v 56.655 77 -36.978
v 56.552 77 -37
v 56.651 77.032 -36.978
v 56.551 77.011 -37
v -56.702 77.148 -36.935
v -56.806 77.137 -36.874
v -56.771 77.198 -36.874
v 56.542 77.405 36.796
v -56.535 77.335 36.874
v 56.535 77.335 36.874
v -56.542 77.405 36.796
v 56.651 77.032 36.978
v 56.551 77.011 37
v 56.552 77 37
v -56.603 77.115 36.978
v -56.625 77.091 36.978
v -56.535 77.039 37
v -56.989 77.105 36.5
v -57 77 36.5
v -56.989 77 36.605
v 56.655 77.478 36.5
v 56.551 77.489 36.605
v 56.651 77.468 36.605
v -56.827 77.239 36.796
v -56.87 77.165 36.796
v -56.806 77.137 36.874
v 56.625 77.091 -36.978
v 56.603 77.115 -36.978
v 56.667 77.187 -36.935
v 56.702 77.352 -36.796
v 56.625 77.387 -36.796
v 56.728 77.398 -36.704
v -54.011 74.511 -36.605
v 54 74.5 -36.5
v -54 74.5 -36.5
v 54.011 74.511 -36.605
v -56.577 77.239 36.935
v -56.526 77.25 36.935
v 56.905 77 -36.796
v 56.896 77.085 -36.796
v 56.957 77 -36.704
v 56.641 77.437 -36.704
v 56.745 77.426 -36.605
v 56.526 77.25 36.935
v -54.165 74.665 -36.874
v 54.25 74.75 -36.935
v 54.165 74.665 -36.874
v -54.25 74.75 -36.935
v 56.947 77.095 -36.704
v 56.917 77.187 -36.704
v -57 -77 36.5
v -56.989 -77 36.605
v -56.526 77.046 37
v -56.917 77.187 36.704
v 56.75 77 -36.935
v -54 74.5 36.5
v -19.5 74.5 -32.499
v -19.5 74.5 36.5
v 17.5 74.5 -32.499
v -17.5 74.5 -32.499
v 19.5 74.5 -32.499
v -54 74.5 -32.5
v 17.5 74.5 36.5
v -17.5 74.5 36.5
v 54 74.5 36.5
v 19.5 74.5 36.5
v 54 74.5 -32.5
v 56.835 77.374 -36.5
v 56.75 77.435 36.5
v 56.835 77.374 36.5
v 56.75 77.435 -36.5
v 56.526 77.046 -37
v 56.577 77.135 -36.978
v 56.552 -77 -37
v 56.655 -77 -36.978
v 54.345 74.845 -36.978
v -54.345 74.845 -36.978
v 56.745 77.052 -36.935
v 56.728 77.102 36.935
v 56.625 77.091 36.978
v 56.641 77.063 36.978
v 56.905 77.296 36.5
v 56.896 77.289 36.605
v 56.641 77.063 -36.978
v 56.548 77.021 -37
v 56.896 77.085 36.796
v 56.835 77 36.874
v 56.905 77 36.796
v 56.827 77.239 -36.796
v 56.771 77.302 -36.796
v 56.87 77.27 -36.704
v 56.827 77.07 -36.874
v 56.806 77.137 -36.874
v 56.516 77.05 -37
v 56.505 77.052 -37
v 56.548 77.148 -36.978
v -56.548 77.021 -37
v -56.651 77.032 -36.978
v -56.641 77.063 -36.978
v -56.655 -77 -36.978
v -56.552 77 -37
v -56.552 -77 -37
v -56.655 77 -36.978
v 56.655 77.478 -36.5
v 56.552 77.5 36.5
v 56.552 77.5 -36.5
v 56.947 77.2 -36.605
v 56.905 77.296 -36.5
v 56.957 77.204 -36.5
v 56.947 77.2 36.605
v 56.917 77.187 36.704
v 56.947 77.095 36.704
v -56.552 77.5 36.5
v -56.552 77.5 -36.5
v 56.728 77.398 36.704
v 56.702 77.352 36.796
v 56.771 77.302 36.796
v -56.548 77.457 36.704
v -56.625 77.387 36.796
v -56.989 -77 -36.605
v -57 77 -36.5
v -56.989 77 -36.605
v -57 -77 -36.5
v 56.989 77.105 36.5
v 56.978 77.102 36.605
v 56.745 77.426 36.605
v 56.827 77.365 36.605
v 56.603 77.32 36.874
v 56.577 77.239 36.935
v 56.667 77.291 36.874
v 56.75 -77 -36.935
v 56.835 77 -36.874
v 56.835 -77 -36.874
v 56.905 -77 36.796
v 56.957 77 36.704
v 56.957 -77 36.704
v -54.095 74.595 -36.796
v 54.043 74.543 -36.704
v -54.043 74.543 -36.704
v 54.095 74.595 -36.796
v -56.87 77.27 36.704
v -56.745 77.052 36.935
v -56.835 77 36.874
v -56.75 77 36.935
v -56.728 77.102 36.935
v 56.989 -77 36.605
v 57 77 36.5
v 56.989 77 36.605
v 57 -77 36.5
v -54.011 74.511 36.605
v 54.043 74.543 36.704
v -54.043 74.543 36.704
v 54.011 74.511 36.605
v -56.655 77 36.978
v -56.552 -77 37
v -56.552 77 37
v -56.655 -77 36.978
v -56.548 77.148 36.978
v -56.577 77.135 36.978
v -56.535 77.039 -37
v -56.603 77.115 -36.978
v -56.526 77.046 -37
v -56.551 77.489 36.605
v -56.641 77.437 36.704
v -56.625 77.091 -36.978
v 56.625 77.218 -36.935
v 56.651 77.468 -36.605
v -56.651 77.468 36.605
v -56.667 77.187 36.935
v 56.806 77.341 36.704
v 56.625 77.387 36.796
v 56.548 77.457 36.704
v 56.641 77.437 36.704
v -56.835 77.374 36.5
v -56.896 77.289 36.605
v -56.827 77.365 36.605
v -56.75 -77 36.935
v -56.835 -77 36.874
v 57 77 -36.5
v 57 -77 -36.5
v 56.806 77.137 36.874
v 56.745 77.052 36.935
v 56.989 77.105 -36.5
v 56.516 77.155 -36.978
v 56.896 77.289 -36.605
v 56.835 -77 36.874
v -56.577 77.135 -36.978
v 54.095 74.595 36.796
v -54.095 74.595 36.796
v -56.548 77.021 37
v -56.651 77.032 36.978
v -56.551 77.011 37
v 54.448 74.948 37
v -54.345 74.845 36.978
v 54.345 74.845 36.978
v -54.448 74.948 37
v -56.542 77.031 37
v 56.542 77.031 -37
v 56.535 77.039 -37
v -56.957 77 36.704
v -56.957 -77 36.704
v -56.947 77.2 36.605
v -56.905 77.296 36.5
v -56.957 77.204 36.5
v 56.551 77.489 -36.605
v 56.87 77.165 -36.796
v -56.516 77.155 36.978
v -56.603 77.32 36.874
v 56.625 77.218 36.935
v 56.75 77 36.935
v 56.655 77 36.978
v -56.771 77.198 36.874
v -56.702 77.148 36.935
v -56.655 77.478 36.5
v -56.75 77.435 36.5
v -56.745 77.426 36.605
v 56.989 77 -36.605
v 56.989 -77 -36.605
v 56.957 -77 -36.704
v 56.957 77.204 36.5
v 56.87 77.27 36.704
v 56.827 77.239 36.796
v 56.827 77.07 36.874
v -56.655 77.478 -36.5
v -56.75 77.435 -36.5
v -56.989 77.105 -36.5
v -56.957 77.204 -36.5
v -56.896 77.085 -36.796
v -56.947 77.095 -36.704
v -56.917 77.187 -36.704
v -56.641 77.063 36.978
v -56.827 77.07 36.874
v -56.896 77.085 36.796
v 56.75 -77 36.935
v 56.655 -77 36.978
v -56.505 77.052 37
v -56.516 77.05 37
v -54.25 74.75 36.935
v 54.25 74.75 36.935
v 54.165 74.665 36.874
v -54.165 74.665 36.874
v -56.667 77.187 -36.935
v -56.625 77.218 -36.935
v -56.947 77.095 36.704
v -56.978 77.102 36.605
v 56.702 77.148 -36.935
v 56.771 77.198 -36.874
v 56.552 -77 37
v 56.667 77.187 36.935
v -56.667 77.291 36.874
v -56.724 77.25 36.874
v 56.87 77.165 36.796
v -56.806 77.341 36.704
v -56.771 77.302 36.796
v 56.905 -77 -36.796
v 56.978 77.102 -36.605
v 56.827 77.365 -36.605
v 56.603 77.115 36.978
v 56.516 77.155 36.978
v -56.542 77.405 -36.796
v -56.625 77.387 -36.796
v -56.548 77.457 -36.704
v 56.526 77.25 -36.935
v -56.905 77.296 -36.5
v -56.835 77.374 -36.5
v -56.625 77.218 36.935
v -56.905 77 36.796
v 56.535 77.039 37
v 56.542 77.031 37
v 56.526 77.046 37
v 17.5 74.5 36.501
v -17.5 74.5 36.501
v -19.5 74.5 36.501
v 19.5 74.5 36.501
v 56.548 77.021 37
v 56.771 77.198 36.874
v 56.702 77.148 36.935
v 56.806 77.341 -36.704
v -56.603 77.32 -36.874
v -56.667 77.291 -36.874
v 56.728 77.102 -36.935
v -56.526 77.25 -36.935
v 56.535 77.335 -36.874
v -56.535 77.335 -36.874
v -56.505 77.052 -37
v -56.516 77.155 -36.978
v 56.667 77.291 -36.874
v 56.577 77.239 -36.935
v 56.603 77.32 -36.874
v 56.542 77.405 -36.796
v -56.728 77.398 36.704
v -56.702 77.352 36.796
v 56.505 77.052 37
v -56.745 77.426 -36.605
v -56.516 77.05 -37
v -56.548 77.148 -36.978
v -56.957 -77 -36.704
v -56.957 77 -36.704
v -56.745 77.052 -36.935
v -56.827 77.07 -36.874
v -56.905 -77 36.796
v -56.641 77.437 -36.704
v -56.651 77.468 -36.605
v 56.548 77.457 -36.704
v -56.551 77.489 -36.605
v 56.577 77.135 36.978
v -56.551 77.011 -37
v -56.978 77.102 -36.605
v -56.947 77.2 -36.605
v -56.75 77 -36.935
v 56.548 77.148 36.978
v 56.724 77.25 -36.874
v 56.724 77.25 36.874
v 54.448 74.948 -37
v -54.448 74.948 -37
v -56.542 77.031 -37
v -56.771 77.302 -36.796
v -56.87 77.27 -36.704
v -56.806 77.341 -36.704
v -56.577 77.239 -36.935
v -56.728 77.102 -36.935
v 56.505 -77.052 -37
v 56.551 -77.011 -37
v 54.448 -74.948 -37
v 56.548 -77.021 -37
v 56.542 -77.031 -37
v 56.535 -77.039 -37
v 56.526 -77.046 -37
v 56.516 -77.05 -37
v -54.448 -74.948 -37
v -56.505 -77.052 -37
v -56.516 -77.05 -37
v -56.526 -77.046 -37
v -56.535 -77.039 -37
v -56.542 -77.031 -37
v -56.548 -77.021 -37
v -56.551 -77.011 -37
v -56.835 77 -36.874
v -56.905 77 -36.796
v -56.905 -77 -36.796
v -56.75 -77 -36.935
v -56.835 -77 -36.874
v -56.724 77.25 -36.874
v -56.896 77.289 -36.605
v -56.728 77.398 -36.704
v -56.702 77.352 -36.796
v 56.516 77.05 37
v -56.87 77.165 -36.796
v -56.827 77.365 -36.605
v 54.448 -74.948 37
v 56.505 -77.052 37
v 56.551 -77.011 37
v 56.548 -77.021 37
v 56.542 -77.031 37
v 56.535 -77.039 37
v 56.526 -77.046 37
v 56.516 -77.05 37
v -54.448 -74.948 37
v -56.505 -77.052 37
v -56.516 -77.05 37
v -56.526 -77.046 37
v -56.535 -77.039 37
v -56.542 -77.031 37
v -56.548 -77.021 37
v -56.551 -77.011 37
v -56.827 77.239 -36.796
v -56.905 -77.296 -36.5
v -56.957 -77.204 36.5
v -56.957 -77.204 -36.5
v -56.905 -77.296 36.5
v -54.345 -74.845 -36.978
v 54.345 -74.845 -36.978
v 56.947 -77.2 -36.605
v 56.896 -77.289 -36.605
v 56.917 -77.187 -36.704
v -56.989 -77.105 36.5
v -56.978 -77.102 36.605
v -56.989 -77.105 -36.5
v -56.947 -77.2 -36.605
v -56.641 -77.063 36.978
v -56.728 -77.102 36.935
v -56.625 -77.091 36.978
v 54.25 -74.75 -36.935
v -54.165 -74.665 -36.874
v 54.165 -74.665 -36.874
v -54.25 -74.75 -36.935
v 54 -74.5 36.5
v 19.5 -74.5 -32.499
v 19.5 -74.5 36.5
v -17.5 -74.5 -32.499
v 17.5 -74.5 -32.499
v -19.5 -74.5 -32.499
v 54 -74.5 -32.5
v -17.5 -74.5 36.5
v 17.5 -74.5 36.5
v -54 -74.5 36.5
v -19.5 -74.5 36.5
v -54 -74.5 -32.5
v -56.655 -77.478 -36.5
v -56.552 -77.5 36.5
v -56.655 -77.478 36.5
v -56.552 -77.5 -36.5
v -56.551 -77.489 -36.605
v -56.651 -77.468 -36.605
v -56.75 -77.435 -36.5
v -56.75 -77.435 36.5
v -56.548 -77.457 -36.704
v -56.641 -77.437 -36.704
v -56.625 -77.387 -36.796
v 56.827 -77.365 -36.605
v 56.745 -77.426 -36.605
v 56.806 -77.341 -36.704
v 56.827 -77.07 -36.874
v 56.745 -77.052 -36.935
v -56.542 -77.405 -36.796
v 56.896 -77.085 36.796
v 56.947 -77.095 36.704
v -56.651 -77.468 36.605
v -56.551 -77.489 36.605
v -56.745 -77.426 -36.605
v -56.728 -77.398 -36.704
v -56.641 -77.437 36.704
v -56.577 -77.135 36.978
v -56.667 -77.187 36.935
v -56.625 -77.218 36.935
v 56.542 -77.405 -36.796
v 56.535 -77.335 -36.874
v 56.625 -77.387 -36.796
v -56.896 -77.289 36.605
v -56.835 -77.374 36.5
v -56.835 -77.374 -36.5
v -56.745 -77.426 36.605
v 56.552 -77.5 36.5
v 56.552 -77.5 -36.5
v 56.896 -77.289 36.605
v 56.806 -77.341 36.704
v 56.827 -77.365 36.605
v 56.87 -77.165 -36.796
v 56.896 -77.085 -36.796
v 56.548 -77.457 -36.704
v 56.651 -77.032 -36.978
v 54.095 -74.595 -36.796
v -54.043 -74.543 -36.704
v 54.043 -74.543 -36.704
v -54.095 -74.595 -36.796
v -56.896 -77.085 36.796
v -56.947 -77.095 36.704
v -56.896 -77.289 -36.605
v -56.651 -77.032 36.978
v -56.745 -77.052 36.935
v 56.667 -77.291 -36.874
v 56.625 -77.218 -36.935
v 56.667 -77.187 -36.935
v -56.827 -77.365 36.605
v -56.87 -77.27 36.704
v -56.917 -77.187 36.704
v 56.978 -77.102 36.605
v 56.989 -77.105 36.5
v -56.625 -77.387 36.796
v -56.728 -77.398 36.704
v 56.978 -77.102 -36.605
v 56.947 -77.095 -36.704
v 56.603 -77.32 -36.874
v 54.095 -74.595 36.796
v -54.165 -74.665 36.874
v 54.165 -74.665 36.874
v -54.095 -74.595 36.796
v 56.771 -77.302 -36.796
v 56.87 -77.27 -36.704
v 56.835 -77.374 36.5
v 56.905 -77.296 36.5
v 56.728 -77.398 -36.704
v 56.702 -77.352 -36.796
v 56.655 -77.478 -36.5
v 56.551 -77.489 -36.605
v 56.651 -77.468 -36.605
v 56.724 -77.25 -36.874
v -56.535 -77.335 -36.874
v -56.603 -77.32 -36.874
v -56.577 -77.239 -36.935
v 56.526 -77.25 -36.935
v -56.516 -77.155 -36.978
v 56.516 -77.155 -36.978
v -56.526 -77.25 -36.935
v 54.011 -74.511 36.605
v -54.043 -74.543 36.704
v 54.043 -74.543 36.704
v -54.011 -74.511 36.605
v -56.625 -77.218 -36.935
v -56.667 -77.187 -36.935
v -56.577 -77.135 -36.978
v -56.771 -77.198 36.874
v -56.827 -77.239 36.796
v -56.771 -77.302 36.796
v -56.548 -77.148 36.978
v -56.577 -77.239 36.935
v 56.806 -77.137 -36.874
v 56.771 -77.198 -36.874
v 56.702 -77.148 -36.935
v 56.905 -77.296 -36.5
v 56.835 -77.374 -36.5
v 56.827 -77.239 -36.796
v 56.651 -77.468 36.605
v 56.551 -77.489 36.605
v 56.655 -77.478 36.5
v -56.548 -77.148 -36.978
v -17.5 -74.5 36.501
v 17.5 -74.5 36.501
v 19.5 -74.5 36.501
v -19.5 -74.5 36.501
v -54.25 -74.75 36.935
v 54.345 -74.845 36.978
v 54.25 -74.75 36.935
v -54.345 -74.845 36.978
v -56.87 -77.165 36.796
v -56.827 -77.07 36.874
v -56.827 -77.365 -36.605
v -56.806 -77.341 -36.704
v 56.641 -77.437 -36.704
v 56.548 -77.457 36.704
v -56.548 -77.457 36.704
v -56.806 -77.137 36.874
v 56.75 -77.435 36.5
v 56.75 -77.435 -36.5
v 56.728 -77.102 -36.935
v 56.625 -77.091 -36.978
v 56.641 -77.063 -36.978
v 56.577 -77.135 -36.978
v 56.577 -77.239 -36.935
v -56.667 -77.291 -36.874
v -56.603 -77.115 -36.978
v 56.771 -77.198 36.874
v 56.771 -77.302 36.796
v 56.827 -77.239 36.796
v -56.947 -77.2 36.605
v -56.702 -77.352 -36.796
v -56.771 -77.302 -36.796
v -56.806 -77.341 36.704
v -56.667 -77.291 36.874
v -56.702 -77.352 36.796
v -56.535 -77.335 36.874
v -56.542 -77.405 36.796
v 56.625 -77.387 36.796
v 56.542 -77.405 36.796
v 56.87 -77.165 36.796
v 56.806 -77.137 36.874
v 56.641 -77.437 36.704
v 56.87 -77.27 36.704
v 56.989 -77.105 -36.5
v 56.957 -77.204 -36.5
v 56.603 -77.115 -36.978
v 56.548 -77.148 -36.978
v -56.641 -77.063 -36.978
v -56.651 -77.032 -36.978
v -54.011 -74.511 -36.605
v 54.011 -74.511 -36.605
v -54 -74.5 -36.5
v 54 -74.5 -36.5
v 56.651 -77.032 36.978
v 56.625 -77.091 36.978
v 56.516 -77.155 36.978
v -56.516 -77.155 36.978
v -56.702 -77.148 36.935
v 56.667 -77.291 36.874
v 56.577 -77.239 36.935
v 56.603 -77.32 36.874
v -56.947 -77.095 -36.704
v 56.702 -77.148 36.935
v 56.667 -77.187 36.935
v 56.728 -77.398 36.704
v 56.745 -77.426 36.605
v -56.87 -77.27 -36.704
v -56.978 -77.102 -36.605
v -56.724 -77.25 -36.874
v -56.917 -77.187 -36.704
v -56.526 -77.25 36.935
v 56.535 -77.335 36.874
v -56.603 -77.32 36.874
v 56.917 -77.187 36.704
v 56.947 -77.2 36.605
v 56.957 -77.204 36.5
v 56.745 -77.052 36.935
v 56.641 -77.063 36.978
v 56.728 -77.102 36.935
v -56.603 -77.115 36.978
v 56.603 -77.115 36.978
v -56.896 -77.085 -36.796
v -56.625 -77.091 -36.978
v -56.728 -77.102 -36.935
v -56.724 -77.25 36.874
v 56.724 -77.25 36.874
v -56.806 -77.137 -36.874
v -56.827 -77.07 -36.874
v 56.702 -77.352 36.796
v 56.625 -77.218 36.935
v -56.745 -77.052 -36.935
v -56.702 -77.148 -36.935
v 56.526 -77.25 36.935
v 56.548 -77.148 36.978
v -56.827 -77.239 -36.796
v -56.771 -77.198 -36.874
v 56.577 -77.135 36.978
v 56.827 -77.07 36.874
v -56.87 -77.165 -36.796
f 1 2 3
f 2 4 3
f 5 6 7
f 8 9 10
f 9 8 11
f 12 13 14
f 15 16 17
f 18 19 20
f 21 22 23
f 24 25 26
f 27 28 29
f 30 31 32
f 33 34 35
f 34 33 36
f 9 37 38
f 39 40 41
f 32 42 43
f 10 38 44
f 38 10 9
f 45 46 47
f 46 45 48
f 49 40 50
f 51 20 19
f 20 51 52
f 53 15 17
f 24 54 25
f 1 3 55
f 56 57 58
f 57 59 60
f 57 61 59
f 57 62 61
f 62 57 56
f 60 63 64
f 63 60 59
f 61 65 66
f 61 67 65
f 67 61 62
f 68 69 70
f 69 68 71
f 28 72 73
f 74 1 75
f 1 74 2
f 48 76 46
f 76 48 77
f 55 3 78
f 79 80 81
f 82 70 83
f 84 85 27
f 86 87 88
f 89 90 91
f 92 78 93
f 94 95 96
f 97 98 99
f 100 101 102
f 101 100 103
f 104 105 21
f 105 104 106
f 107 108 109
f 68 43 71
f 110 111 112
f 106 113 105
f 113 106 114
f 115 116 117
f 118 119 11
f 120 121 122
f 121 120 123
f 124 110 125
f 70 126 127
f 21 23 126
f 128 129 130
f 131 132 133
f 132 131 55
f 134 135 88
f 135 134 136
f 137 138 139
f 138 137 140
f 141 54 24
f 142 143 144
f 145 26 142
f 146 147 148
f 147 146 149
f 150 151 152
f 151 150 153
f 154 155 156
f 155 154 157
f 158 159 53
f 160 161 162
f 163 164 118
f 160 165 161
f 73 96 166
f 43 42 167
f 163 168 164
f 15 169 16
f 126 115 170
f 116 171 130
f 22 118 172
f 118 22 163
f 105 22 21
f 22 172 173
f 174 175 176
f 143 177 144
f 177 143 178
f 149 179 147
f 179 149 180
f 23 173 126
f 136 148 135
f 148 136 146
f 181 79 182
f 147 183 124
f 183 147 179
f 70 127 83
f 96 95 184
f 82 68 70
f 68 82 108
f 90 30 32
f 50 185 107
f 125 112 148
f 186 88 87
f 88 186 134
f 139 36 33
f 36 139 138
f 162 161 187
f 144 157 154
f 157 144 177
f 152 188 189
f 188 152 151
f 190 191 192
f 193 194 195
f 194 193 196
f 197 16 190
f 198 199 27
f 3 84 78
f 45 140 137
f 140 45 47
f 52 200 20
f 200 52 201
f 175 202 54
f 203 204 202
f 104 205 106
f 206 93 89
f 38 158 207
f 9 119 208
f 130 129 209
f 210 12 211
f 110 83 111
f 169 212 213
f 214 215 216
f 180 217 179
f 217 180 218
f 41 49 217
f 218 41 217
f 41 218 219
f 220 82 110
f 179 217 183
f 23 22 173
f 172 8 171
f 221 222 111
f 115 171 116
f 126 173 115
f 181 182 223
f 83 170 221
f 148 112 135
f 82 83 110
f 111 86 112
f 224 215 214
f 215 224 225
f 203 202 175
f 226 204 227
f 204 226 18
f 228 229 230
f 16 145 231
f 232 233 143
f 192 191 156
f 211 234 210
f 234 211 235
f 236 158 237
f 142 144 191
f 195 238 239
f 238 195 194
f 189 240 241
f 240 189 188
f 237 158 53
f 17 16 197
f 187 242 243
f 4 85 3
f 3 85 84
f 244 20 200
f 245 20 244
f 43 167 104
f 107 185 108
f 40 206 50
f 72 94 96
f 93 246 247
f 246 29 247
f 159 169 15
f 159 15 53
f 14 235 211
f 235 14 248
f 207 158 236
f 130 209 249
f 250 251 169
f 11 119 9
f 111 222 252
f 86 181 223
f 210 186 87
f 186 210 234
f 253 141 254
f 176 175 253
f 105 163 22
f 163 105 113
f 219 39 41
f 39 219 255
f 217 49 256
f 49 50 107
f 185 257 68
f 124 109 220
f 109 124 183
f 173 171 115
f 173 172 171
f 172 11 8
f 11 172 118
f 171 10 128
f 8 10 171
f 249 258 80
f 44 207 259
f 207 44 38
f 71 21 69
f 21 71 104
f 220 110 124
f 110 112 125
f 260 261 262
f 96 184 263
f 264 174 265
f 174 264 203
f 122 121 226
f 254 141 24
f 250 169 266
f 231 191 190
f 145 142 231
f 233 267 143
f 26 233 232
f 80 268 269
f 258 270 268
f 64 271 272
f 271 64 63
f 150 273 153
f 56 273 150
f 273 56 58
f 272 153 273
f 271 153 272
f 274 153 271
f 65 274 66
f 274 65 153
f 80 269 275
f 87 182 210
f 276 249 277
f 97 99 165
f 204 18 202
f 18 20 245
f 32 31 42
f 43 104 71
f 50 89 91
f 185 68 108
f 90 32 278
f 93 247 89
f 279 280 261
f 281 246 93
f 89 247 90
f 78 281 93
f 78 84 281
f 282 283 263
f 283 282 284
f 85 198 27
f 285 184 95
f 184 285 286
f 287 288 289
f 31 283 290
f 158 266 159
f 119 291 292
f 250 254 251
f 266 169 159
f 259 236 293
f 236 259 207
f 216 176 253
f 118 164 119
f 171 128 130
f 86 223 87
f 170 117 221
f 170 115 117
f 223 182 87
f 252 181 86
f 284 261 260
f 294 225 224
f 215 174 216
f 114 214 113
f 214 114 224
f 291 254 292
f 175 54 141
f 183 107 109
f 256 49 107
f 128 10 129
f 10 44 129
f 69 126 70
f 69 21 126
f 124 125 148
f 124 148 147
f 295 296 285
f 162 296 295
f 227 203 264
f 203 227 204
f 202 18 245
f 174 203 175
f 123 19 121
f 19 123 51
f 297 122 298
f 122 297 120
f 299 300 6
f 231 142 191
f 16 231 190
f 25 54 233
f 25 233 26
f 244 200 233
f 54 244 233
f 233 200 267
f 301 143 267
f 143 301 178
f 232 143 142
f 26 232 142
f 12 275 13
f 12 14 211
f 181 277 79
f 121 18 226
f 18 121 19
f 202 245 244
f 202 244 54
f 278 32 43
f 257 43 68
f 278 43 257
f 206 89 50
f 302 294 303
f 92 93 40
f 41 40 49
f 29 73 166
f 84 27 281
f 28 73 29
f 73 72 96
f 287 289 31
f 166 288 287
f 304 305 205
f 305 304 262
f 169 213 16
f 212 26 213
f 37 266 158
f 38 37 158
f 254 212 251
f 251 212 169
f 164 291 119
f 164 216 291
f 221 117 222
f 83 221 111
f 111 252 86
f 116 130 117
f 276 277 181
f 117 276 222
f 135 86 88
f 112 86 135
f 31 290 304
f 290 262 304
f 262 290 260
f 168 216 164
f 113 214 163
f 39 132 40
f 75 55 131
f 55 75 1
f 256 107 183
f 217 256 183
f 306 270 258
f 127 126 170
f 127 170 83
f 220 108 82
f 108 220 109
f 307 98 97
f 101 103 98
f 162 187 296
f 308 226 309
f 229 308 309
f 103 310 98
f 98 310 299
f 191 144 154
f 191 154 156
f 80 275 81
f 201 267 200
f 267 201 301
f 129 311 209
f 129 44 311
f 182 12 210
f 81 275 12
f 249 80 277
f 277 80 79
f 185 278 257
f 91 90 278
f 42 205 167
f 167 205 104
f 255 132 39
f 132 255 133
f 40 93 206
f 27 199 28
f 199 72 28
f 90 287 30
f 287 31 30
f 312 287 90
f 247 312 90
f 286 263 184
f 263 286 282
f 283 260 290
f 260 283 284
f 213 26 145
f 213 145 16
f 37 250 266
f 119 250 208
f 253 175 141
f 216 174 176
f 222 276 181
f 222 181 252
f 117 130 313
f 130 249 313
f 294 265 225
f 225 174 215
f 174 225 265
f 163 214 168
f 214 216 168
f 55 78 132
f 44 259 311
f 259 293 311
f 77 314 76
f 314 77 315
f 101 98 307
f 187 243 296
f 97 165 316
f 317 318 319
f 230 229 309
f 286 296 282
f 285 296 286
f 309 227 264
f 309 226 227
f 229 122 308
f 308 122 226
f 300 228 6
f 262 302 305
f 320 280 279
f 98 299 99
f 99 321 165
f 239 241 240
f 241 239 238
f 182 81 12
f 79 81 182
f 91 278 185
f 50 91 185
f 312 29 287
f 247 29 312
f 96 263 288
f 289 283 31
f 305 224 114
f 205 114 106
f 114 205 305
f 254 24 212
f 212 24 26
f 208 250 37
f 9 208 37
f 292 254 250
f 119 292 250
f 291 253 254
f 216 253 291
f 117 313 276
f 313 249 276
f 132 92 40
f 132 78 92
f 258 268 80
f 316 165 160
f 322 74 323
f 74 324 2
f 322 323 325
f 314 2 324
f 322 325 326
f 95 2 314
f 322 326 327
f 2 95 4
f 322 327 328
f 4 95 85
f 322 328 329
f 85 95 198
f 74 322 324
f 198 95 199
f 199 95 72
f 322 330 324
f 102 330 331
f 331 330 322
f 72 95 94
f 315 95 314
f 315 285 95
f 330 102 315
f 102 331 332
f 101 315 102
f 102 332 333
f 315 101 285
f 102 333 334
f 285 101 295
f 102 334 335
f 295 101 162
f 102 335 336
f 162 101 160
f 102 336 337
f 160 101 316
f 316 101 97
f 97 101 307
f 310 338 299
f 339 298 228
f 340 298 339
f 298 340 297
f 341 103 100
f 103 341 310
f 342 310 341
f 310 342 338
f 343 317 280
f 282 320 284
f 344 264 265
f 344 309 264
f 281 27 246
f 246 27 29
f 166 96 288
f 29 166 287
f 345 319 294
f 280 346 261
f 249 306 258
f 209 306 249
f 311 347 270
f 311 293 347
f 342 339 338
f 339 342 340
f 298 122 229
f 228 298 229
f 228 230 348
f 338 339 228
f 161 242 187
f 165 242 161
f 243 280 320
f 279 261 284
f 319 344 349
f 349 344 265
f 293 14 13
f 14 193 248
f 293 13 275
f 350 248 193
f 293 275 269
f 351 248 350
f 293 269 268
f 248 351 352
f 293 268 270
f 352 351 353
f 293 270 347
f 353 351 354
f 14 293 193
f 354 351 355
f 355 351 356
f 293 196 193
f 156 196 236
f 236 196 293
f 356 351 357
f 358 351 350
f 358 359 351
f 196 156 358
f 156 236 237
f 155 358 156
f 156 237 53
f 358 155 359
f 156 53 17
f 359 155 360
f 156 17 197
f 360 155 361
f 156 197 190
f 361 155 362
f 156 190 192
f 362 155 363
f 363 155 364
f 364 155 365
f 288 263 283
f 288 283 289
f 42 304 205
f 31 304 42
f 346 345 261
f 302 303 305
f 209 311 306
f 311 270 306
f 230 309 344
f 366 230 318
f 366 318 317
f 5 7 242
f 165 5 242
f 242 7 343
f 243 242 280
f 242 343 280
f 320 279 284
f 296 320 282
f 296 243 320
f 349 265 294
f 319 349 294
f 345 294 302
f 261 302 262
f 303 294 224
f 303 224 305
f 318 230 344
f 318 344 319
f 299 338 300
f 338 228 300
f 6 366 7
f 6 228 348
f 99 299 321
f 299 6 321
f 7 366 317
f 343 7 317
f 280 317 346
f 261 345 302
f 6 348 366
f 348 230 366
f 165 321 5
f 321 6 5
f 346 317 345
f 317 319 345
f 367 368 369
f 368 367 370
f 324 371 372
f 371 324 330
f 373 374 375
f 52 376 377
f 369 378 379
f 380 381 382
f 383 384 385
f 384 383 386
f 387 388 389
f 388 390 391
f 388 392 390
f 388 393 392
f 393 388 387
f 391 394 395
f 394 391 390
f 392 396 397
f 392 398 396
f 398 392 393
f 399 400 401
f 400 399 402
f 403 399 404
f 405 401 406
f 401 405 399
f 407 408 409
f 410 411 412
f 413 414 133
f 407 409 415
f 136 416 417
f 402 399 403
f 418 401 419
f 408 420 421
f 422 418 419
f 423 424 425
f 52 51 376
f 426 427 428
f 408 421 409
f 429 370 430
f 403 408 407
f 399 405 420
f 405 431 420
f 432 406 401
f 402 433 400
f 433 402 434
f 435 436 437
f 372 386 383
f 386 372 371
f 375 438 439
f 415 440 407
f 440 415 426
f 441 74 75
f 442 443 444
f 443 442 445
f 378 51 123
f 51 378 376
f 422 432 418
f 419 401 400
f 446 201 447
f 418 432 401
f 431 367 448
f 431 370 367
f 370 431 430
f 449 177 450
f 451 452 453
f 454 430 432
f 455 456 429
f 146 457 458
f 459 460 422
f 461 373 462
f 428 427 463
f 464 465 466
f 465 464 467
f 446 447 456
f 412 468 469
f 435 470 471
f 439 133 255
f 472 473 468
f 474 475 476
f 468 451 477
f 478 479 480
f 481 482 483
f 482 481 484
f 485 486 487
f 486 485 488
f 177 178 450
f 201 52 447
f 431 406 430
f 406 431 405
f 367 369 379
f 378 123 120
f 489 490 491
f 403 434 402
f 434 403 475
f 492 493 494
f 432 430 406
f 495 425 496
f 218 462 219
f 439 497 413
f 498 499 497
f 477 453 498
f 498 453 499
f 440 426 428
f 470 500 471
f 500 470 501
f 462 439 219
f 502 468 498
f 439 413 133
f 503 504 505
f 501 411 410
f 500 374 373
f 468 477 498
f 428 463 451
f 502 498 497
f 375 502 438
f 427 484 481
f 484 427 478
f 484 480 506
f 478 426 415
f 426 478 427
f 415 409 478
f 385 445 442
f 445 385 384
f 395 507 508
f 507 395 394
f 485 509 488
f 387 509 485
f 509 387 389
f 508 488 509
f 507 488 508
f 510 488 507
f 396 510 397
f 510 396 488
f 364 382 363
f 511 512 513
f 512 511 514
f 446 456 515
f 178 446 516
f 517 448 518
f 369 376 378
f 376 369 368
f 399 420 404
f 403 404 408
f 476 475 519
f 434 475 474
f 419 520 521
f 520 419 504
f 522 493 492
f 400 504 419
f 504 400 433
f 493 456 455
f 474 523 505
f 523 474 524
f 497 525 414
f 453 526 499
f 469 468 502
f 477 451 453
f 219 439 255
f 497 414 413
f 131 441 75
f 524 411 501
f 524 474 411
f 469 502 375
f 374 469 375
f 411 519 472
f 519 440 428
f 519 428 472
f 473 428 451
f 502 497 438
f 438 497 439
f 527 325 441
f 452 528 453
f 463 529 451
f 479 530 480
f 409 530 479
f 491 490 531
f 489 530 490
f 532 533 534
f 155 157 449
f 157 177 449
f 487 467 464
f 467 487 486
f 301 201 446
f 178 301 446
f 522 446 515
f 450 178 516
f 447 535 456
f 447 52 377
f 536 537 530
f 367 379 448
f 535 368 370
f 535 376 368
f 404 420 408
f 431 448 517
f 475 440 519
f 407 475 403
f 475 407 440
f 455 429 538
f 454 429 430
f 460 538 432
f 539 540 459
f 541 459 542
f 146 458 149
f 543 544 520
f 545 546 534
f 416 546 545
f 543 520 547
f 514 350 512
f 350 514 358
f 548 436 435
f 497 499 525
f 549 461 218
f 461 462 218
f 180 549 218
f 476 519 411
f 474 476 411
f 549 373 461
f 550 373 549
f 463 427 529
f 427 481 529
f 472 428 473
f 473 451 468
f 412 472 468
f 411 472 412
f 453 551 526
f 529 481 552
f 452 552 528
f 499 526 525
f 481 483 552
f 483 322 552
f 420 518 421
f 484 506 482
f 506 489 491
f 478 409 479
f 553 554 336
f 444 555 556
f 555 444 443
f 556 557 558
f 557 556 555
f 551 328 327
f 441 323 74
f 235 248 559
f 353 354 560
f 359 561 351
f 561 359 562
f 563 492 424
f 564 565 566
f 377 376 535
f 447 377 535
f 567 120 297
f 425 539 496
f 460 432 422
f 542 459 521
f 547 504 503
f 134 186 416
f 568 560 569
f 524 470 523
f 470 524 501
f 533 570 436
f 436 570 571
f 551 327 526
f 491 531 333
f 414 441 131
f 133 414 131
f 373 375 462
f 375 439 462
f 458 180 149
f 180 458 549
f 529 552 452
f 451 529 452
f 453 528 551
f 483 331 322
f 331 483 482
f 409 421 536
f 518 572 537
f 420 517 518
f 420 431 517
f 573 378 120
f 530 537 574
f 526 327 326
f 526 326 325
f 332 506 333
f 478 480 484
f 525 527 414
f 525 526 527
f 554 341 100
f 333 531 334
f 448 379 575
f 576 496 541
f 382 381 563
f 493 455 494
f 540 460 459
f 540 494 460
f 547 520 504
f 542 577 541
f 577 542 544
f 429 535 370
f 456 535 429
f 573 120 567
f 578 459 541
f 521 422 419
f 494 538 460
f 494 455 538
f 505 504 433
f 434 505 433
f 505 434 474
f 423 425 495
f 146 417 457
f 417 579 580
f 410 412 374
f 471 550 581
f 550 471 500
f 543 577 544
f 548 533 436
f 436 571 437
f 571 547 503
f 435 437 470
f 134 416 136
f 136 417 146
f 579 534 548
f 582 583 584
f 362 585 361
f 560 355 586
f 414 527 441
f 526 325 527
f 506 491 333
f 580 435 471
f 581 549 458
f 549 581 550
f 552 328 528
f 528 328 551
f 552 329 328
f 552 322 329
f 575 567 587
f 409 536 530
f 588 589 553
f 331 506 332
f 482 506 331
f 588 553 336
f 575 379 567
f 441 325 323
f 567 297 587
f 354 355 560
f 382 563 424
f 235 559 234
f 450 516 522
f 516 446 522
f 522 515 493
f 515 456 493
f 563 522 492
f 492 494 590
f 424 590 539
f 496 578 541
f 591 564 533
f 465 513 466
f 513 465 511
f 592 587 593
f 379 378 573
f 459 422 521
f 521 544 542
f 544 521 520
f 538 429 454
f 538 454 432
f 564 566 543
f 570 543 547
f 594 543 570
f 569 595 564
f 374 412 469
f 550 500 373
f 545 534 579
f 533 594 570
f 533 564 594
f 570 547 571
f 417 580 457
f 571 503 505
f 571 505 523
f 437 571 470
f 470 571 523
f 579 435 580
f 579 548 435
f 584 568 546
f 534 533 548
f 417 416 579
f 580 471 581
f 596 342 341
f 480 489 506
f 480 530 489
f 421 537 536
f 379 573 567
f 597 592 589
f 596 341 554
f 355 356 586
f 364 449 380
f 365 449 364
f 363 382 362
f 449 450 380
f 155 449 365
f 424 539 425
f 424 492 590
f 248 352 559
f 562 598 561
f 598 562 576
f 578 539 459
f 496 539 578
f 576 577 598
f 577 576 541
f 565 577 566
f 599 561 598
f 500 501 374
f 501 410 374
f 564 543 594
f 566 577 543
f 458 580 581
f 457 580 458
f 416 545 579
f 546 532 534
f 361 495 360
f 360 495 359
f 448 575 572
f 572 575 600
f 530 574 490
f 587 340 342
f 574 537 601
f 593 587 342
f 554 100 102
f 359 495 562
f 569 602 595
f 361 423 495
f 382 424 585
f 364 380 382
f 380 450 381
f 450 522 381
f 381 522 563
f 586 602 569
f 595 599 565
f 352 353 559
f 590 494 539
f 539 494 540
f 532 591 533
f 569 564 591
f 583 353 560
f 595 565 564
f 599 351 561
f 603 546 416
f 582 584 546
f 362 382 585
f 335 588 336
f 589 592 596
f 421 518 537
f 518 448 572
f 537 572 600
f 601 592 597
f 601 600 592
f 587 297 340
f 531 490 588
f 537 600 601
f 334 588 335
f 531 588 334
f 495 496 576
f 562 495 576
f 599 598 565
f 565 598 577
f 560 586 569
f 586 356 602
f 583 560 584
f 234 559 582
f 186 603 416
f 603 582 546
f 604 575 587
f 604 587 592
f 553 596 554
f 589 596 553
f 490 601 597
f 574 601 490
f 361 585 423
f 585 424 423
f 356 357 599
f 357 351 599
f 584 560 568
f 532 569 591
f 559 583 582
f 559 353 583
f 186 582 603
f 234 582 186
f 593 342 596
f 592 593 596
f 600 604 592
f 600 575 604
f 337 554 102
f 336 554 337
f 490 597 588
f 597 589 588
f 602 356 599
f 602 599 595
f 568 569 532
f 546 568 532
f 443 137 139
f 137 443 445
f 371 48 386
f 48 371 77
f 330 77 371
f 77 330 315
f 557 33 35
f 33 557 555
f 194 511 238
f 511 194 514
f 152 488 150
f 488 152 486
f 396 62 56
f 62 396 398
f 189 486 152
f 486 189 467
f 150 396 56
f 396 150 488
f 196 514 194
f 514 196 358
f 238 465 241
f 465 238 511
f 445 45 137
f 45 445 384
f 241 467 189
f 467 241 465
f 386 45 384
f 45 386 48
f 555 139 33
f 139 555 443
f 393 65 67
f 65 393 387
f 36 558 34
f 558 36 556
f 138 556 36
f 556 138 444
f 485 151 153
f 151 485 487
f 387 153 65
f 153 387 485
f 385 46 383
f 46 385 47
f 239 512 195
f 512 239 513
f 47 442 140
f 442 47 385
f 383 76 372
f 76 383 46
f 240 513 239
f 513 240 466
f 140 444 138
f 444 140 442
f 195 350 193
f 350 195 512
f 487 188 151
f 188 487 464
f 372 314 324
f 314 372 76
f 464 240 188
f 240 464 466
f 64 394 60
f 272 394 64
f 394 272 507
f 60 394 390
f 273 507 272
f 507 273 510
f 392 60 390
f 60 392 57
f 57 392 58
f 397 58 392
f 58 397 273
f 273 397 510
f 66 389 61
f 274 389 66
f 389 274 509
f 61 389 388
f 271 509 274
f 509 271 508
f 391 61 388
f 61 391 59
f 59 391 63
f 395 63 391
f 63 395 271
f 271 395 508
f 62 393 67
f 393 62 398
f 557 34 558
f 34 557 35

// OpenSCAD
// ======================
// Parameters (define tray first)
// ======================

// Tray dimensions
tray_length = 150;     // Each tray's length (X)
tray_width = 35;      // Each tray's width (Y)
tray_height = 69;     // Tray usable height (Z)

// Tray setup
tray_count = 3;       // How many trays

// Wall and divider settings
wall_thickness = 2;    // Outer wall thickness
floor_thickness = 4;   // Bottom thickness
divider_thickness = 2; // Divider thickness

// Fillet radius
box_fillet_radius = wall_thickness / 2;     // Corner rounding radius
divider_fillet_radius = divider_thickness / 2;

// ======================
// Derived dimensions
// ======================

inner_width = tray_length;
inner_length = tray_width * tray_count + (tray_count - 1) * divider_thickness;
inner_height = tray_height;

box_length = inner_length + 2 * wall_thickness;
box_width = inner_width + 2 * wall_thickness;
box_height = inner_height + floor_thickness;

tolerance = 0.001;

module debug(name, l, w, h) {
    echo(str("Your ", name, " is ", l, " by ", w, " by ", h));
}

// ======================
// Helper Modules
// ======================

// Fillet a box, adjusting for size shrinkage automatically
module fillet_box(l, w, h, r) {
    resize([l, w, h])
        fillet(r) {
            cube([l, w, h], center=true);
        }
}

module fillet(r) {
    minkowski() {
        children();  // this means "apply to whatever shape is inside"
        resize([r, r, r])
            sphere(10); // Or sphere(r) if you want a perfect sphere
    }
}

module box_body() {
    debug("box body", box_length, box_width, box_height);
    cube([box_length, box_width, box_height], center=true);
    //fillet_box(box_length, box_width, box_height, box_fillet_radius);
}

module inner_space() {
    debug("inner space", inner_length, inner_width, inner_height);
    cube([inner_length, inner_width, inner_height], center=true);
}

module dividers() {
    for (i = [1 : tray_count - 1]) {
        // since we are centered, and it should be at n * tray_width + how many existing dividers and the half divider width to be centered...
        center = -inner_length/2 + i * tray_width + (i - 1) * divider_thickness + divider_thickness/2;
        translate([
            center,
            0,
            0
        ])
        cube([divider_thickness, inner_width, inner_height], center=true);
        //fillet_box(divider_thickness, inner_width, inner_height, divider_fillet_radius);
    }
}

module walls_only_box() {
    fillet(box_fillet_radius) {
        difference() {
            cube([box_length, box_width, box_height], center=true);
            cube([inner_length, inner_width, box_height], center=true);
        }
    }
}

module bottom_plate() {
    cube([inner_length + tolerance, inner_width + tolerance, floor_thickness], center=true);
}

module open_top_box() {
    // fillet(fillet_radius)
    walls_only_box();

    translate([0, 0, -box_height/2 + floor_thickness/2])
        bottom_plate();

    translate([0, 0, (box_height - inner_height)/2 + tolerance])
        dividers();
}

open_top_box();
